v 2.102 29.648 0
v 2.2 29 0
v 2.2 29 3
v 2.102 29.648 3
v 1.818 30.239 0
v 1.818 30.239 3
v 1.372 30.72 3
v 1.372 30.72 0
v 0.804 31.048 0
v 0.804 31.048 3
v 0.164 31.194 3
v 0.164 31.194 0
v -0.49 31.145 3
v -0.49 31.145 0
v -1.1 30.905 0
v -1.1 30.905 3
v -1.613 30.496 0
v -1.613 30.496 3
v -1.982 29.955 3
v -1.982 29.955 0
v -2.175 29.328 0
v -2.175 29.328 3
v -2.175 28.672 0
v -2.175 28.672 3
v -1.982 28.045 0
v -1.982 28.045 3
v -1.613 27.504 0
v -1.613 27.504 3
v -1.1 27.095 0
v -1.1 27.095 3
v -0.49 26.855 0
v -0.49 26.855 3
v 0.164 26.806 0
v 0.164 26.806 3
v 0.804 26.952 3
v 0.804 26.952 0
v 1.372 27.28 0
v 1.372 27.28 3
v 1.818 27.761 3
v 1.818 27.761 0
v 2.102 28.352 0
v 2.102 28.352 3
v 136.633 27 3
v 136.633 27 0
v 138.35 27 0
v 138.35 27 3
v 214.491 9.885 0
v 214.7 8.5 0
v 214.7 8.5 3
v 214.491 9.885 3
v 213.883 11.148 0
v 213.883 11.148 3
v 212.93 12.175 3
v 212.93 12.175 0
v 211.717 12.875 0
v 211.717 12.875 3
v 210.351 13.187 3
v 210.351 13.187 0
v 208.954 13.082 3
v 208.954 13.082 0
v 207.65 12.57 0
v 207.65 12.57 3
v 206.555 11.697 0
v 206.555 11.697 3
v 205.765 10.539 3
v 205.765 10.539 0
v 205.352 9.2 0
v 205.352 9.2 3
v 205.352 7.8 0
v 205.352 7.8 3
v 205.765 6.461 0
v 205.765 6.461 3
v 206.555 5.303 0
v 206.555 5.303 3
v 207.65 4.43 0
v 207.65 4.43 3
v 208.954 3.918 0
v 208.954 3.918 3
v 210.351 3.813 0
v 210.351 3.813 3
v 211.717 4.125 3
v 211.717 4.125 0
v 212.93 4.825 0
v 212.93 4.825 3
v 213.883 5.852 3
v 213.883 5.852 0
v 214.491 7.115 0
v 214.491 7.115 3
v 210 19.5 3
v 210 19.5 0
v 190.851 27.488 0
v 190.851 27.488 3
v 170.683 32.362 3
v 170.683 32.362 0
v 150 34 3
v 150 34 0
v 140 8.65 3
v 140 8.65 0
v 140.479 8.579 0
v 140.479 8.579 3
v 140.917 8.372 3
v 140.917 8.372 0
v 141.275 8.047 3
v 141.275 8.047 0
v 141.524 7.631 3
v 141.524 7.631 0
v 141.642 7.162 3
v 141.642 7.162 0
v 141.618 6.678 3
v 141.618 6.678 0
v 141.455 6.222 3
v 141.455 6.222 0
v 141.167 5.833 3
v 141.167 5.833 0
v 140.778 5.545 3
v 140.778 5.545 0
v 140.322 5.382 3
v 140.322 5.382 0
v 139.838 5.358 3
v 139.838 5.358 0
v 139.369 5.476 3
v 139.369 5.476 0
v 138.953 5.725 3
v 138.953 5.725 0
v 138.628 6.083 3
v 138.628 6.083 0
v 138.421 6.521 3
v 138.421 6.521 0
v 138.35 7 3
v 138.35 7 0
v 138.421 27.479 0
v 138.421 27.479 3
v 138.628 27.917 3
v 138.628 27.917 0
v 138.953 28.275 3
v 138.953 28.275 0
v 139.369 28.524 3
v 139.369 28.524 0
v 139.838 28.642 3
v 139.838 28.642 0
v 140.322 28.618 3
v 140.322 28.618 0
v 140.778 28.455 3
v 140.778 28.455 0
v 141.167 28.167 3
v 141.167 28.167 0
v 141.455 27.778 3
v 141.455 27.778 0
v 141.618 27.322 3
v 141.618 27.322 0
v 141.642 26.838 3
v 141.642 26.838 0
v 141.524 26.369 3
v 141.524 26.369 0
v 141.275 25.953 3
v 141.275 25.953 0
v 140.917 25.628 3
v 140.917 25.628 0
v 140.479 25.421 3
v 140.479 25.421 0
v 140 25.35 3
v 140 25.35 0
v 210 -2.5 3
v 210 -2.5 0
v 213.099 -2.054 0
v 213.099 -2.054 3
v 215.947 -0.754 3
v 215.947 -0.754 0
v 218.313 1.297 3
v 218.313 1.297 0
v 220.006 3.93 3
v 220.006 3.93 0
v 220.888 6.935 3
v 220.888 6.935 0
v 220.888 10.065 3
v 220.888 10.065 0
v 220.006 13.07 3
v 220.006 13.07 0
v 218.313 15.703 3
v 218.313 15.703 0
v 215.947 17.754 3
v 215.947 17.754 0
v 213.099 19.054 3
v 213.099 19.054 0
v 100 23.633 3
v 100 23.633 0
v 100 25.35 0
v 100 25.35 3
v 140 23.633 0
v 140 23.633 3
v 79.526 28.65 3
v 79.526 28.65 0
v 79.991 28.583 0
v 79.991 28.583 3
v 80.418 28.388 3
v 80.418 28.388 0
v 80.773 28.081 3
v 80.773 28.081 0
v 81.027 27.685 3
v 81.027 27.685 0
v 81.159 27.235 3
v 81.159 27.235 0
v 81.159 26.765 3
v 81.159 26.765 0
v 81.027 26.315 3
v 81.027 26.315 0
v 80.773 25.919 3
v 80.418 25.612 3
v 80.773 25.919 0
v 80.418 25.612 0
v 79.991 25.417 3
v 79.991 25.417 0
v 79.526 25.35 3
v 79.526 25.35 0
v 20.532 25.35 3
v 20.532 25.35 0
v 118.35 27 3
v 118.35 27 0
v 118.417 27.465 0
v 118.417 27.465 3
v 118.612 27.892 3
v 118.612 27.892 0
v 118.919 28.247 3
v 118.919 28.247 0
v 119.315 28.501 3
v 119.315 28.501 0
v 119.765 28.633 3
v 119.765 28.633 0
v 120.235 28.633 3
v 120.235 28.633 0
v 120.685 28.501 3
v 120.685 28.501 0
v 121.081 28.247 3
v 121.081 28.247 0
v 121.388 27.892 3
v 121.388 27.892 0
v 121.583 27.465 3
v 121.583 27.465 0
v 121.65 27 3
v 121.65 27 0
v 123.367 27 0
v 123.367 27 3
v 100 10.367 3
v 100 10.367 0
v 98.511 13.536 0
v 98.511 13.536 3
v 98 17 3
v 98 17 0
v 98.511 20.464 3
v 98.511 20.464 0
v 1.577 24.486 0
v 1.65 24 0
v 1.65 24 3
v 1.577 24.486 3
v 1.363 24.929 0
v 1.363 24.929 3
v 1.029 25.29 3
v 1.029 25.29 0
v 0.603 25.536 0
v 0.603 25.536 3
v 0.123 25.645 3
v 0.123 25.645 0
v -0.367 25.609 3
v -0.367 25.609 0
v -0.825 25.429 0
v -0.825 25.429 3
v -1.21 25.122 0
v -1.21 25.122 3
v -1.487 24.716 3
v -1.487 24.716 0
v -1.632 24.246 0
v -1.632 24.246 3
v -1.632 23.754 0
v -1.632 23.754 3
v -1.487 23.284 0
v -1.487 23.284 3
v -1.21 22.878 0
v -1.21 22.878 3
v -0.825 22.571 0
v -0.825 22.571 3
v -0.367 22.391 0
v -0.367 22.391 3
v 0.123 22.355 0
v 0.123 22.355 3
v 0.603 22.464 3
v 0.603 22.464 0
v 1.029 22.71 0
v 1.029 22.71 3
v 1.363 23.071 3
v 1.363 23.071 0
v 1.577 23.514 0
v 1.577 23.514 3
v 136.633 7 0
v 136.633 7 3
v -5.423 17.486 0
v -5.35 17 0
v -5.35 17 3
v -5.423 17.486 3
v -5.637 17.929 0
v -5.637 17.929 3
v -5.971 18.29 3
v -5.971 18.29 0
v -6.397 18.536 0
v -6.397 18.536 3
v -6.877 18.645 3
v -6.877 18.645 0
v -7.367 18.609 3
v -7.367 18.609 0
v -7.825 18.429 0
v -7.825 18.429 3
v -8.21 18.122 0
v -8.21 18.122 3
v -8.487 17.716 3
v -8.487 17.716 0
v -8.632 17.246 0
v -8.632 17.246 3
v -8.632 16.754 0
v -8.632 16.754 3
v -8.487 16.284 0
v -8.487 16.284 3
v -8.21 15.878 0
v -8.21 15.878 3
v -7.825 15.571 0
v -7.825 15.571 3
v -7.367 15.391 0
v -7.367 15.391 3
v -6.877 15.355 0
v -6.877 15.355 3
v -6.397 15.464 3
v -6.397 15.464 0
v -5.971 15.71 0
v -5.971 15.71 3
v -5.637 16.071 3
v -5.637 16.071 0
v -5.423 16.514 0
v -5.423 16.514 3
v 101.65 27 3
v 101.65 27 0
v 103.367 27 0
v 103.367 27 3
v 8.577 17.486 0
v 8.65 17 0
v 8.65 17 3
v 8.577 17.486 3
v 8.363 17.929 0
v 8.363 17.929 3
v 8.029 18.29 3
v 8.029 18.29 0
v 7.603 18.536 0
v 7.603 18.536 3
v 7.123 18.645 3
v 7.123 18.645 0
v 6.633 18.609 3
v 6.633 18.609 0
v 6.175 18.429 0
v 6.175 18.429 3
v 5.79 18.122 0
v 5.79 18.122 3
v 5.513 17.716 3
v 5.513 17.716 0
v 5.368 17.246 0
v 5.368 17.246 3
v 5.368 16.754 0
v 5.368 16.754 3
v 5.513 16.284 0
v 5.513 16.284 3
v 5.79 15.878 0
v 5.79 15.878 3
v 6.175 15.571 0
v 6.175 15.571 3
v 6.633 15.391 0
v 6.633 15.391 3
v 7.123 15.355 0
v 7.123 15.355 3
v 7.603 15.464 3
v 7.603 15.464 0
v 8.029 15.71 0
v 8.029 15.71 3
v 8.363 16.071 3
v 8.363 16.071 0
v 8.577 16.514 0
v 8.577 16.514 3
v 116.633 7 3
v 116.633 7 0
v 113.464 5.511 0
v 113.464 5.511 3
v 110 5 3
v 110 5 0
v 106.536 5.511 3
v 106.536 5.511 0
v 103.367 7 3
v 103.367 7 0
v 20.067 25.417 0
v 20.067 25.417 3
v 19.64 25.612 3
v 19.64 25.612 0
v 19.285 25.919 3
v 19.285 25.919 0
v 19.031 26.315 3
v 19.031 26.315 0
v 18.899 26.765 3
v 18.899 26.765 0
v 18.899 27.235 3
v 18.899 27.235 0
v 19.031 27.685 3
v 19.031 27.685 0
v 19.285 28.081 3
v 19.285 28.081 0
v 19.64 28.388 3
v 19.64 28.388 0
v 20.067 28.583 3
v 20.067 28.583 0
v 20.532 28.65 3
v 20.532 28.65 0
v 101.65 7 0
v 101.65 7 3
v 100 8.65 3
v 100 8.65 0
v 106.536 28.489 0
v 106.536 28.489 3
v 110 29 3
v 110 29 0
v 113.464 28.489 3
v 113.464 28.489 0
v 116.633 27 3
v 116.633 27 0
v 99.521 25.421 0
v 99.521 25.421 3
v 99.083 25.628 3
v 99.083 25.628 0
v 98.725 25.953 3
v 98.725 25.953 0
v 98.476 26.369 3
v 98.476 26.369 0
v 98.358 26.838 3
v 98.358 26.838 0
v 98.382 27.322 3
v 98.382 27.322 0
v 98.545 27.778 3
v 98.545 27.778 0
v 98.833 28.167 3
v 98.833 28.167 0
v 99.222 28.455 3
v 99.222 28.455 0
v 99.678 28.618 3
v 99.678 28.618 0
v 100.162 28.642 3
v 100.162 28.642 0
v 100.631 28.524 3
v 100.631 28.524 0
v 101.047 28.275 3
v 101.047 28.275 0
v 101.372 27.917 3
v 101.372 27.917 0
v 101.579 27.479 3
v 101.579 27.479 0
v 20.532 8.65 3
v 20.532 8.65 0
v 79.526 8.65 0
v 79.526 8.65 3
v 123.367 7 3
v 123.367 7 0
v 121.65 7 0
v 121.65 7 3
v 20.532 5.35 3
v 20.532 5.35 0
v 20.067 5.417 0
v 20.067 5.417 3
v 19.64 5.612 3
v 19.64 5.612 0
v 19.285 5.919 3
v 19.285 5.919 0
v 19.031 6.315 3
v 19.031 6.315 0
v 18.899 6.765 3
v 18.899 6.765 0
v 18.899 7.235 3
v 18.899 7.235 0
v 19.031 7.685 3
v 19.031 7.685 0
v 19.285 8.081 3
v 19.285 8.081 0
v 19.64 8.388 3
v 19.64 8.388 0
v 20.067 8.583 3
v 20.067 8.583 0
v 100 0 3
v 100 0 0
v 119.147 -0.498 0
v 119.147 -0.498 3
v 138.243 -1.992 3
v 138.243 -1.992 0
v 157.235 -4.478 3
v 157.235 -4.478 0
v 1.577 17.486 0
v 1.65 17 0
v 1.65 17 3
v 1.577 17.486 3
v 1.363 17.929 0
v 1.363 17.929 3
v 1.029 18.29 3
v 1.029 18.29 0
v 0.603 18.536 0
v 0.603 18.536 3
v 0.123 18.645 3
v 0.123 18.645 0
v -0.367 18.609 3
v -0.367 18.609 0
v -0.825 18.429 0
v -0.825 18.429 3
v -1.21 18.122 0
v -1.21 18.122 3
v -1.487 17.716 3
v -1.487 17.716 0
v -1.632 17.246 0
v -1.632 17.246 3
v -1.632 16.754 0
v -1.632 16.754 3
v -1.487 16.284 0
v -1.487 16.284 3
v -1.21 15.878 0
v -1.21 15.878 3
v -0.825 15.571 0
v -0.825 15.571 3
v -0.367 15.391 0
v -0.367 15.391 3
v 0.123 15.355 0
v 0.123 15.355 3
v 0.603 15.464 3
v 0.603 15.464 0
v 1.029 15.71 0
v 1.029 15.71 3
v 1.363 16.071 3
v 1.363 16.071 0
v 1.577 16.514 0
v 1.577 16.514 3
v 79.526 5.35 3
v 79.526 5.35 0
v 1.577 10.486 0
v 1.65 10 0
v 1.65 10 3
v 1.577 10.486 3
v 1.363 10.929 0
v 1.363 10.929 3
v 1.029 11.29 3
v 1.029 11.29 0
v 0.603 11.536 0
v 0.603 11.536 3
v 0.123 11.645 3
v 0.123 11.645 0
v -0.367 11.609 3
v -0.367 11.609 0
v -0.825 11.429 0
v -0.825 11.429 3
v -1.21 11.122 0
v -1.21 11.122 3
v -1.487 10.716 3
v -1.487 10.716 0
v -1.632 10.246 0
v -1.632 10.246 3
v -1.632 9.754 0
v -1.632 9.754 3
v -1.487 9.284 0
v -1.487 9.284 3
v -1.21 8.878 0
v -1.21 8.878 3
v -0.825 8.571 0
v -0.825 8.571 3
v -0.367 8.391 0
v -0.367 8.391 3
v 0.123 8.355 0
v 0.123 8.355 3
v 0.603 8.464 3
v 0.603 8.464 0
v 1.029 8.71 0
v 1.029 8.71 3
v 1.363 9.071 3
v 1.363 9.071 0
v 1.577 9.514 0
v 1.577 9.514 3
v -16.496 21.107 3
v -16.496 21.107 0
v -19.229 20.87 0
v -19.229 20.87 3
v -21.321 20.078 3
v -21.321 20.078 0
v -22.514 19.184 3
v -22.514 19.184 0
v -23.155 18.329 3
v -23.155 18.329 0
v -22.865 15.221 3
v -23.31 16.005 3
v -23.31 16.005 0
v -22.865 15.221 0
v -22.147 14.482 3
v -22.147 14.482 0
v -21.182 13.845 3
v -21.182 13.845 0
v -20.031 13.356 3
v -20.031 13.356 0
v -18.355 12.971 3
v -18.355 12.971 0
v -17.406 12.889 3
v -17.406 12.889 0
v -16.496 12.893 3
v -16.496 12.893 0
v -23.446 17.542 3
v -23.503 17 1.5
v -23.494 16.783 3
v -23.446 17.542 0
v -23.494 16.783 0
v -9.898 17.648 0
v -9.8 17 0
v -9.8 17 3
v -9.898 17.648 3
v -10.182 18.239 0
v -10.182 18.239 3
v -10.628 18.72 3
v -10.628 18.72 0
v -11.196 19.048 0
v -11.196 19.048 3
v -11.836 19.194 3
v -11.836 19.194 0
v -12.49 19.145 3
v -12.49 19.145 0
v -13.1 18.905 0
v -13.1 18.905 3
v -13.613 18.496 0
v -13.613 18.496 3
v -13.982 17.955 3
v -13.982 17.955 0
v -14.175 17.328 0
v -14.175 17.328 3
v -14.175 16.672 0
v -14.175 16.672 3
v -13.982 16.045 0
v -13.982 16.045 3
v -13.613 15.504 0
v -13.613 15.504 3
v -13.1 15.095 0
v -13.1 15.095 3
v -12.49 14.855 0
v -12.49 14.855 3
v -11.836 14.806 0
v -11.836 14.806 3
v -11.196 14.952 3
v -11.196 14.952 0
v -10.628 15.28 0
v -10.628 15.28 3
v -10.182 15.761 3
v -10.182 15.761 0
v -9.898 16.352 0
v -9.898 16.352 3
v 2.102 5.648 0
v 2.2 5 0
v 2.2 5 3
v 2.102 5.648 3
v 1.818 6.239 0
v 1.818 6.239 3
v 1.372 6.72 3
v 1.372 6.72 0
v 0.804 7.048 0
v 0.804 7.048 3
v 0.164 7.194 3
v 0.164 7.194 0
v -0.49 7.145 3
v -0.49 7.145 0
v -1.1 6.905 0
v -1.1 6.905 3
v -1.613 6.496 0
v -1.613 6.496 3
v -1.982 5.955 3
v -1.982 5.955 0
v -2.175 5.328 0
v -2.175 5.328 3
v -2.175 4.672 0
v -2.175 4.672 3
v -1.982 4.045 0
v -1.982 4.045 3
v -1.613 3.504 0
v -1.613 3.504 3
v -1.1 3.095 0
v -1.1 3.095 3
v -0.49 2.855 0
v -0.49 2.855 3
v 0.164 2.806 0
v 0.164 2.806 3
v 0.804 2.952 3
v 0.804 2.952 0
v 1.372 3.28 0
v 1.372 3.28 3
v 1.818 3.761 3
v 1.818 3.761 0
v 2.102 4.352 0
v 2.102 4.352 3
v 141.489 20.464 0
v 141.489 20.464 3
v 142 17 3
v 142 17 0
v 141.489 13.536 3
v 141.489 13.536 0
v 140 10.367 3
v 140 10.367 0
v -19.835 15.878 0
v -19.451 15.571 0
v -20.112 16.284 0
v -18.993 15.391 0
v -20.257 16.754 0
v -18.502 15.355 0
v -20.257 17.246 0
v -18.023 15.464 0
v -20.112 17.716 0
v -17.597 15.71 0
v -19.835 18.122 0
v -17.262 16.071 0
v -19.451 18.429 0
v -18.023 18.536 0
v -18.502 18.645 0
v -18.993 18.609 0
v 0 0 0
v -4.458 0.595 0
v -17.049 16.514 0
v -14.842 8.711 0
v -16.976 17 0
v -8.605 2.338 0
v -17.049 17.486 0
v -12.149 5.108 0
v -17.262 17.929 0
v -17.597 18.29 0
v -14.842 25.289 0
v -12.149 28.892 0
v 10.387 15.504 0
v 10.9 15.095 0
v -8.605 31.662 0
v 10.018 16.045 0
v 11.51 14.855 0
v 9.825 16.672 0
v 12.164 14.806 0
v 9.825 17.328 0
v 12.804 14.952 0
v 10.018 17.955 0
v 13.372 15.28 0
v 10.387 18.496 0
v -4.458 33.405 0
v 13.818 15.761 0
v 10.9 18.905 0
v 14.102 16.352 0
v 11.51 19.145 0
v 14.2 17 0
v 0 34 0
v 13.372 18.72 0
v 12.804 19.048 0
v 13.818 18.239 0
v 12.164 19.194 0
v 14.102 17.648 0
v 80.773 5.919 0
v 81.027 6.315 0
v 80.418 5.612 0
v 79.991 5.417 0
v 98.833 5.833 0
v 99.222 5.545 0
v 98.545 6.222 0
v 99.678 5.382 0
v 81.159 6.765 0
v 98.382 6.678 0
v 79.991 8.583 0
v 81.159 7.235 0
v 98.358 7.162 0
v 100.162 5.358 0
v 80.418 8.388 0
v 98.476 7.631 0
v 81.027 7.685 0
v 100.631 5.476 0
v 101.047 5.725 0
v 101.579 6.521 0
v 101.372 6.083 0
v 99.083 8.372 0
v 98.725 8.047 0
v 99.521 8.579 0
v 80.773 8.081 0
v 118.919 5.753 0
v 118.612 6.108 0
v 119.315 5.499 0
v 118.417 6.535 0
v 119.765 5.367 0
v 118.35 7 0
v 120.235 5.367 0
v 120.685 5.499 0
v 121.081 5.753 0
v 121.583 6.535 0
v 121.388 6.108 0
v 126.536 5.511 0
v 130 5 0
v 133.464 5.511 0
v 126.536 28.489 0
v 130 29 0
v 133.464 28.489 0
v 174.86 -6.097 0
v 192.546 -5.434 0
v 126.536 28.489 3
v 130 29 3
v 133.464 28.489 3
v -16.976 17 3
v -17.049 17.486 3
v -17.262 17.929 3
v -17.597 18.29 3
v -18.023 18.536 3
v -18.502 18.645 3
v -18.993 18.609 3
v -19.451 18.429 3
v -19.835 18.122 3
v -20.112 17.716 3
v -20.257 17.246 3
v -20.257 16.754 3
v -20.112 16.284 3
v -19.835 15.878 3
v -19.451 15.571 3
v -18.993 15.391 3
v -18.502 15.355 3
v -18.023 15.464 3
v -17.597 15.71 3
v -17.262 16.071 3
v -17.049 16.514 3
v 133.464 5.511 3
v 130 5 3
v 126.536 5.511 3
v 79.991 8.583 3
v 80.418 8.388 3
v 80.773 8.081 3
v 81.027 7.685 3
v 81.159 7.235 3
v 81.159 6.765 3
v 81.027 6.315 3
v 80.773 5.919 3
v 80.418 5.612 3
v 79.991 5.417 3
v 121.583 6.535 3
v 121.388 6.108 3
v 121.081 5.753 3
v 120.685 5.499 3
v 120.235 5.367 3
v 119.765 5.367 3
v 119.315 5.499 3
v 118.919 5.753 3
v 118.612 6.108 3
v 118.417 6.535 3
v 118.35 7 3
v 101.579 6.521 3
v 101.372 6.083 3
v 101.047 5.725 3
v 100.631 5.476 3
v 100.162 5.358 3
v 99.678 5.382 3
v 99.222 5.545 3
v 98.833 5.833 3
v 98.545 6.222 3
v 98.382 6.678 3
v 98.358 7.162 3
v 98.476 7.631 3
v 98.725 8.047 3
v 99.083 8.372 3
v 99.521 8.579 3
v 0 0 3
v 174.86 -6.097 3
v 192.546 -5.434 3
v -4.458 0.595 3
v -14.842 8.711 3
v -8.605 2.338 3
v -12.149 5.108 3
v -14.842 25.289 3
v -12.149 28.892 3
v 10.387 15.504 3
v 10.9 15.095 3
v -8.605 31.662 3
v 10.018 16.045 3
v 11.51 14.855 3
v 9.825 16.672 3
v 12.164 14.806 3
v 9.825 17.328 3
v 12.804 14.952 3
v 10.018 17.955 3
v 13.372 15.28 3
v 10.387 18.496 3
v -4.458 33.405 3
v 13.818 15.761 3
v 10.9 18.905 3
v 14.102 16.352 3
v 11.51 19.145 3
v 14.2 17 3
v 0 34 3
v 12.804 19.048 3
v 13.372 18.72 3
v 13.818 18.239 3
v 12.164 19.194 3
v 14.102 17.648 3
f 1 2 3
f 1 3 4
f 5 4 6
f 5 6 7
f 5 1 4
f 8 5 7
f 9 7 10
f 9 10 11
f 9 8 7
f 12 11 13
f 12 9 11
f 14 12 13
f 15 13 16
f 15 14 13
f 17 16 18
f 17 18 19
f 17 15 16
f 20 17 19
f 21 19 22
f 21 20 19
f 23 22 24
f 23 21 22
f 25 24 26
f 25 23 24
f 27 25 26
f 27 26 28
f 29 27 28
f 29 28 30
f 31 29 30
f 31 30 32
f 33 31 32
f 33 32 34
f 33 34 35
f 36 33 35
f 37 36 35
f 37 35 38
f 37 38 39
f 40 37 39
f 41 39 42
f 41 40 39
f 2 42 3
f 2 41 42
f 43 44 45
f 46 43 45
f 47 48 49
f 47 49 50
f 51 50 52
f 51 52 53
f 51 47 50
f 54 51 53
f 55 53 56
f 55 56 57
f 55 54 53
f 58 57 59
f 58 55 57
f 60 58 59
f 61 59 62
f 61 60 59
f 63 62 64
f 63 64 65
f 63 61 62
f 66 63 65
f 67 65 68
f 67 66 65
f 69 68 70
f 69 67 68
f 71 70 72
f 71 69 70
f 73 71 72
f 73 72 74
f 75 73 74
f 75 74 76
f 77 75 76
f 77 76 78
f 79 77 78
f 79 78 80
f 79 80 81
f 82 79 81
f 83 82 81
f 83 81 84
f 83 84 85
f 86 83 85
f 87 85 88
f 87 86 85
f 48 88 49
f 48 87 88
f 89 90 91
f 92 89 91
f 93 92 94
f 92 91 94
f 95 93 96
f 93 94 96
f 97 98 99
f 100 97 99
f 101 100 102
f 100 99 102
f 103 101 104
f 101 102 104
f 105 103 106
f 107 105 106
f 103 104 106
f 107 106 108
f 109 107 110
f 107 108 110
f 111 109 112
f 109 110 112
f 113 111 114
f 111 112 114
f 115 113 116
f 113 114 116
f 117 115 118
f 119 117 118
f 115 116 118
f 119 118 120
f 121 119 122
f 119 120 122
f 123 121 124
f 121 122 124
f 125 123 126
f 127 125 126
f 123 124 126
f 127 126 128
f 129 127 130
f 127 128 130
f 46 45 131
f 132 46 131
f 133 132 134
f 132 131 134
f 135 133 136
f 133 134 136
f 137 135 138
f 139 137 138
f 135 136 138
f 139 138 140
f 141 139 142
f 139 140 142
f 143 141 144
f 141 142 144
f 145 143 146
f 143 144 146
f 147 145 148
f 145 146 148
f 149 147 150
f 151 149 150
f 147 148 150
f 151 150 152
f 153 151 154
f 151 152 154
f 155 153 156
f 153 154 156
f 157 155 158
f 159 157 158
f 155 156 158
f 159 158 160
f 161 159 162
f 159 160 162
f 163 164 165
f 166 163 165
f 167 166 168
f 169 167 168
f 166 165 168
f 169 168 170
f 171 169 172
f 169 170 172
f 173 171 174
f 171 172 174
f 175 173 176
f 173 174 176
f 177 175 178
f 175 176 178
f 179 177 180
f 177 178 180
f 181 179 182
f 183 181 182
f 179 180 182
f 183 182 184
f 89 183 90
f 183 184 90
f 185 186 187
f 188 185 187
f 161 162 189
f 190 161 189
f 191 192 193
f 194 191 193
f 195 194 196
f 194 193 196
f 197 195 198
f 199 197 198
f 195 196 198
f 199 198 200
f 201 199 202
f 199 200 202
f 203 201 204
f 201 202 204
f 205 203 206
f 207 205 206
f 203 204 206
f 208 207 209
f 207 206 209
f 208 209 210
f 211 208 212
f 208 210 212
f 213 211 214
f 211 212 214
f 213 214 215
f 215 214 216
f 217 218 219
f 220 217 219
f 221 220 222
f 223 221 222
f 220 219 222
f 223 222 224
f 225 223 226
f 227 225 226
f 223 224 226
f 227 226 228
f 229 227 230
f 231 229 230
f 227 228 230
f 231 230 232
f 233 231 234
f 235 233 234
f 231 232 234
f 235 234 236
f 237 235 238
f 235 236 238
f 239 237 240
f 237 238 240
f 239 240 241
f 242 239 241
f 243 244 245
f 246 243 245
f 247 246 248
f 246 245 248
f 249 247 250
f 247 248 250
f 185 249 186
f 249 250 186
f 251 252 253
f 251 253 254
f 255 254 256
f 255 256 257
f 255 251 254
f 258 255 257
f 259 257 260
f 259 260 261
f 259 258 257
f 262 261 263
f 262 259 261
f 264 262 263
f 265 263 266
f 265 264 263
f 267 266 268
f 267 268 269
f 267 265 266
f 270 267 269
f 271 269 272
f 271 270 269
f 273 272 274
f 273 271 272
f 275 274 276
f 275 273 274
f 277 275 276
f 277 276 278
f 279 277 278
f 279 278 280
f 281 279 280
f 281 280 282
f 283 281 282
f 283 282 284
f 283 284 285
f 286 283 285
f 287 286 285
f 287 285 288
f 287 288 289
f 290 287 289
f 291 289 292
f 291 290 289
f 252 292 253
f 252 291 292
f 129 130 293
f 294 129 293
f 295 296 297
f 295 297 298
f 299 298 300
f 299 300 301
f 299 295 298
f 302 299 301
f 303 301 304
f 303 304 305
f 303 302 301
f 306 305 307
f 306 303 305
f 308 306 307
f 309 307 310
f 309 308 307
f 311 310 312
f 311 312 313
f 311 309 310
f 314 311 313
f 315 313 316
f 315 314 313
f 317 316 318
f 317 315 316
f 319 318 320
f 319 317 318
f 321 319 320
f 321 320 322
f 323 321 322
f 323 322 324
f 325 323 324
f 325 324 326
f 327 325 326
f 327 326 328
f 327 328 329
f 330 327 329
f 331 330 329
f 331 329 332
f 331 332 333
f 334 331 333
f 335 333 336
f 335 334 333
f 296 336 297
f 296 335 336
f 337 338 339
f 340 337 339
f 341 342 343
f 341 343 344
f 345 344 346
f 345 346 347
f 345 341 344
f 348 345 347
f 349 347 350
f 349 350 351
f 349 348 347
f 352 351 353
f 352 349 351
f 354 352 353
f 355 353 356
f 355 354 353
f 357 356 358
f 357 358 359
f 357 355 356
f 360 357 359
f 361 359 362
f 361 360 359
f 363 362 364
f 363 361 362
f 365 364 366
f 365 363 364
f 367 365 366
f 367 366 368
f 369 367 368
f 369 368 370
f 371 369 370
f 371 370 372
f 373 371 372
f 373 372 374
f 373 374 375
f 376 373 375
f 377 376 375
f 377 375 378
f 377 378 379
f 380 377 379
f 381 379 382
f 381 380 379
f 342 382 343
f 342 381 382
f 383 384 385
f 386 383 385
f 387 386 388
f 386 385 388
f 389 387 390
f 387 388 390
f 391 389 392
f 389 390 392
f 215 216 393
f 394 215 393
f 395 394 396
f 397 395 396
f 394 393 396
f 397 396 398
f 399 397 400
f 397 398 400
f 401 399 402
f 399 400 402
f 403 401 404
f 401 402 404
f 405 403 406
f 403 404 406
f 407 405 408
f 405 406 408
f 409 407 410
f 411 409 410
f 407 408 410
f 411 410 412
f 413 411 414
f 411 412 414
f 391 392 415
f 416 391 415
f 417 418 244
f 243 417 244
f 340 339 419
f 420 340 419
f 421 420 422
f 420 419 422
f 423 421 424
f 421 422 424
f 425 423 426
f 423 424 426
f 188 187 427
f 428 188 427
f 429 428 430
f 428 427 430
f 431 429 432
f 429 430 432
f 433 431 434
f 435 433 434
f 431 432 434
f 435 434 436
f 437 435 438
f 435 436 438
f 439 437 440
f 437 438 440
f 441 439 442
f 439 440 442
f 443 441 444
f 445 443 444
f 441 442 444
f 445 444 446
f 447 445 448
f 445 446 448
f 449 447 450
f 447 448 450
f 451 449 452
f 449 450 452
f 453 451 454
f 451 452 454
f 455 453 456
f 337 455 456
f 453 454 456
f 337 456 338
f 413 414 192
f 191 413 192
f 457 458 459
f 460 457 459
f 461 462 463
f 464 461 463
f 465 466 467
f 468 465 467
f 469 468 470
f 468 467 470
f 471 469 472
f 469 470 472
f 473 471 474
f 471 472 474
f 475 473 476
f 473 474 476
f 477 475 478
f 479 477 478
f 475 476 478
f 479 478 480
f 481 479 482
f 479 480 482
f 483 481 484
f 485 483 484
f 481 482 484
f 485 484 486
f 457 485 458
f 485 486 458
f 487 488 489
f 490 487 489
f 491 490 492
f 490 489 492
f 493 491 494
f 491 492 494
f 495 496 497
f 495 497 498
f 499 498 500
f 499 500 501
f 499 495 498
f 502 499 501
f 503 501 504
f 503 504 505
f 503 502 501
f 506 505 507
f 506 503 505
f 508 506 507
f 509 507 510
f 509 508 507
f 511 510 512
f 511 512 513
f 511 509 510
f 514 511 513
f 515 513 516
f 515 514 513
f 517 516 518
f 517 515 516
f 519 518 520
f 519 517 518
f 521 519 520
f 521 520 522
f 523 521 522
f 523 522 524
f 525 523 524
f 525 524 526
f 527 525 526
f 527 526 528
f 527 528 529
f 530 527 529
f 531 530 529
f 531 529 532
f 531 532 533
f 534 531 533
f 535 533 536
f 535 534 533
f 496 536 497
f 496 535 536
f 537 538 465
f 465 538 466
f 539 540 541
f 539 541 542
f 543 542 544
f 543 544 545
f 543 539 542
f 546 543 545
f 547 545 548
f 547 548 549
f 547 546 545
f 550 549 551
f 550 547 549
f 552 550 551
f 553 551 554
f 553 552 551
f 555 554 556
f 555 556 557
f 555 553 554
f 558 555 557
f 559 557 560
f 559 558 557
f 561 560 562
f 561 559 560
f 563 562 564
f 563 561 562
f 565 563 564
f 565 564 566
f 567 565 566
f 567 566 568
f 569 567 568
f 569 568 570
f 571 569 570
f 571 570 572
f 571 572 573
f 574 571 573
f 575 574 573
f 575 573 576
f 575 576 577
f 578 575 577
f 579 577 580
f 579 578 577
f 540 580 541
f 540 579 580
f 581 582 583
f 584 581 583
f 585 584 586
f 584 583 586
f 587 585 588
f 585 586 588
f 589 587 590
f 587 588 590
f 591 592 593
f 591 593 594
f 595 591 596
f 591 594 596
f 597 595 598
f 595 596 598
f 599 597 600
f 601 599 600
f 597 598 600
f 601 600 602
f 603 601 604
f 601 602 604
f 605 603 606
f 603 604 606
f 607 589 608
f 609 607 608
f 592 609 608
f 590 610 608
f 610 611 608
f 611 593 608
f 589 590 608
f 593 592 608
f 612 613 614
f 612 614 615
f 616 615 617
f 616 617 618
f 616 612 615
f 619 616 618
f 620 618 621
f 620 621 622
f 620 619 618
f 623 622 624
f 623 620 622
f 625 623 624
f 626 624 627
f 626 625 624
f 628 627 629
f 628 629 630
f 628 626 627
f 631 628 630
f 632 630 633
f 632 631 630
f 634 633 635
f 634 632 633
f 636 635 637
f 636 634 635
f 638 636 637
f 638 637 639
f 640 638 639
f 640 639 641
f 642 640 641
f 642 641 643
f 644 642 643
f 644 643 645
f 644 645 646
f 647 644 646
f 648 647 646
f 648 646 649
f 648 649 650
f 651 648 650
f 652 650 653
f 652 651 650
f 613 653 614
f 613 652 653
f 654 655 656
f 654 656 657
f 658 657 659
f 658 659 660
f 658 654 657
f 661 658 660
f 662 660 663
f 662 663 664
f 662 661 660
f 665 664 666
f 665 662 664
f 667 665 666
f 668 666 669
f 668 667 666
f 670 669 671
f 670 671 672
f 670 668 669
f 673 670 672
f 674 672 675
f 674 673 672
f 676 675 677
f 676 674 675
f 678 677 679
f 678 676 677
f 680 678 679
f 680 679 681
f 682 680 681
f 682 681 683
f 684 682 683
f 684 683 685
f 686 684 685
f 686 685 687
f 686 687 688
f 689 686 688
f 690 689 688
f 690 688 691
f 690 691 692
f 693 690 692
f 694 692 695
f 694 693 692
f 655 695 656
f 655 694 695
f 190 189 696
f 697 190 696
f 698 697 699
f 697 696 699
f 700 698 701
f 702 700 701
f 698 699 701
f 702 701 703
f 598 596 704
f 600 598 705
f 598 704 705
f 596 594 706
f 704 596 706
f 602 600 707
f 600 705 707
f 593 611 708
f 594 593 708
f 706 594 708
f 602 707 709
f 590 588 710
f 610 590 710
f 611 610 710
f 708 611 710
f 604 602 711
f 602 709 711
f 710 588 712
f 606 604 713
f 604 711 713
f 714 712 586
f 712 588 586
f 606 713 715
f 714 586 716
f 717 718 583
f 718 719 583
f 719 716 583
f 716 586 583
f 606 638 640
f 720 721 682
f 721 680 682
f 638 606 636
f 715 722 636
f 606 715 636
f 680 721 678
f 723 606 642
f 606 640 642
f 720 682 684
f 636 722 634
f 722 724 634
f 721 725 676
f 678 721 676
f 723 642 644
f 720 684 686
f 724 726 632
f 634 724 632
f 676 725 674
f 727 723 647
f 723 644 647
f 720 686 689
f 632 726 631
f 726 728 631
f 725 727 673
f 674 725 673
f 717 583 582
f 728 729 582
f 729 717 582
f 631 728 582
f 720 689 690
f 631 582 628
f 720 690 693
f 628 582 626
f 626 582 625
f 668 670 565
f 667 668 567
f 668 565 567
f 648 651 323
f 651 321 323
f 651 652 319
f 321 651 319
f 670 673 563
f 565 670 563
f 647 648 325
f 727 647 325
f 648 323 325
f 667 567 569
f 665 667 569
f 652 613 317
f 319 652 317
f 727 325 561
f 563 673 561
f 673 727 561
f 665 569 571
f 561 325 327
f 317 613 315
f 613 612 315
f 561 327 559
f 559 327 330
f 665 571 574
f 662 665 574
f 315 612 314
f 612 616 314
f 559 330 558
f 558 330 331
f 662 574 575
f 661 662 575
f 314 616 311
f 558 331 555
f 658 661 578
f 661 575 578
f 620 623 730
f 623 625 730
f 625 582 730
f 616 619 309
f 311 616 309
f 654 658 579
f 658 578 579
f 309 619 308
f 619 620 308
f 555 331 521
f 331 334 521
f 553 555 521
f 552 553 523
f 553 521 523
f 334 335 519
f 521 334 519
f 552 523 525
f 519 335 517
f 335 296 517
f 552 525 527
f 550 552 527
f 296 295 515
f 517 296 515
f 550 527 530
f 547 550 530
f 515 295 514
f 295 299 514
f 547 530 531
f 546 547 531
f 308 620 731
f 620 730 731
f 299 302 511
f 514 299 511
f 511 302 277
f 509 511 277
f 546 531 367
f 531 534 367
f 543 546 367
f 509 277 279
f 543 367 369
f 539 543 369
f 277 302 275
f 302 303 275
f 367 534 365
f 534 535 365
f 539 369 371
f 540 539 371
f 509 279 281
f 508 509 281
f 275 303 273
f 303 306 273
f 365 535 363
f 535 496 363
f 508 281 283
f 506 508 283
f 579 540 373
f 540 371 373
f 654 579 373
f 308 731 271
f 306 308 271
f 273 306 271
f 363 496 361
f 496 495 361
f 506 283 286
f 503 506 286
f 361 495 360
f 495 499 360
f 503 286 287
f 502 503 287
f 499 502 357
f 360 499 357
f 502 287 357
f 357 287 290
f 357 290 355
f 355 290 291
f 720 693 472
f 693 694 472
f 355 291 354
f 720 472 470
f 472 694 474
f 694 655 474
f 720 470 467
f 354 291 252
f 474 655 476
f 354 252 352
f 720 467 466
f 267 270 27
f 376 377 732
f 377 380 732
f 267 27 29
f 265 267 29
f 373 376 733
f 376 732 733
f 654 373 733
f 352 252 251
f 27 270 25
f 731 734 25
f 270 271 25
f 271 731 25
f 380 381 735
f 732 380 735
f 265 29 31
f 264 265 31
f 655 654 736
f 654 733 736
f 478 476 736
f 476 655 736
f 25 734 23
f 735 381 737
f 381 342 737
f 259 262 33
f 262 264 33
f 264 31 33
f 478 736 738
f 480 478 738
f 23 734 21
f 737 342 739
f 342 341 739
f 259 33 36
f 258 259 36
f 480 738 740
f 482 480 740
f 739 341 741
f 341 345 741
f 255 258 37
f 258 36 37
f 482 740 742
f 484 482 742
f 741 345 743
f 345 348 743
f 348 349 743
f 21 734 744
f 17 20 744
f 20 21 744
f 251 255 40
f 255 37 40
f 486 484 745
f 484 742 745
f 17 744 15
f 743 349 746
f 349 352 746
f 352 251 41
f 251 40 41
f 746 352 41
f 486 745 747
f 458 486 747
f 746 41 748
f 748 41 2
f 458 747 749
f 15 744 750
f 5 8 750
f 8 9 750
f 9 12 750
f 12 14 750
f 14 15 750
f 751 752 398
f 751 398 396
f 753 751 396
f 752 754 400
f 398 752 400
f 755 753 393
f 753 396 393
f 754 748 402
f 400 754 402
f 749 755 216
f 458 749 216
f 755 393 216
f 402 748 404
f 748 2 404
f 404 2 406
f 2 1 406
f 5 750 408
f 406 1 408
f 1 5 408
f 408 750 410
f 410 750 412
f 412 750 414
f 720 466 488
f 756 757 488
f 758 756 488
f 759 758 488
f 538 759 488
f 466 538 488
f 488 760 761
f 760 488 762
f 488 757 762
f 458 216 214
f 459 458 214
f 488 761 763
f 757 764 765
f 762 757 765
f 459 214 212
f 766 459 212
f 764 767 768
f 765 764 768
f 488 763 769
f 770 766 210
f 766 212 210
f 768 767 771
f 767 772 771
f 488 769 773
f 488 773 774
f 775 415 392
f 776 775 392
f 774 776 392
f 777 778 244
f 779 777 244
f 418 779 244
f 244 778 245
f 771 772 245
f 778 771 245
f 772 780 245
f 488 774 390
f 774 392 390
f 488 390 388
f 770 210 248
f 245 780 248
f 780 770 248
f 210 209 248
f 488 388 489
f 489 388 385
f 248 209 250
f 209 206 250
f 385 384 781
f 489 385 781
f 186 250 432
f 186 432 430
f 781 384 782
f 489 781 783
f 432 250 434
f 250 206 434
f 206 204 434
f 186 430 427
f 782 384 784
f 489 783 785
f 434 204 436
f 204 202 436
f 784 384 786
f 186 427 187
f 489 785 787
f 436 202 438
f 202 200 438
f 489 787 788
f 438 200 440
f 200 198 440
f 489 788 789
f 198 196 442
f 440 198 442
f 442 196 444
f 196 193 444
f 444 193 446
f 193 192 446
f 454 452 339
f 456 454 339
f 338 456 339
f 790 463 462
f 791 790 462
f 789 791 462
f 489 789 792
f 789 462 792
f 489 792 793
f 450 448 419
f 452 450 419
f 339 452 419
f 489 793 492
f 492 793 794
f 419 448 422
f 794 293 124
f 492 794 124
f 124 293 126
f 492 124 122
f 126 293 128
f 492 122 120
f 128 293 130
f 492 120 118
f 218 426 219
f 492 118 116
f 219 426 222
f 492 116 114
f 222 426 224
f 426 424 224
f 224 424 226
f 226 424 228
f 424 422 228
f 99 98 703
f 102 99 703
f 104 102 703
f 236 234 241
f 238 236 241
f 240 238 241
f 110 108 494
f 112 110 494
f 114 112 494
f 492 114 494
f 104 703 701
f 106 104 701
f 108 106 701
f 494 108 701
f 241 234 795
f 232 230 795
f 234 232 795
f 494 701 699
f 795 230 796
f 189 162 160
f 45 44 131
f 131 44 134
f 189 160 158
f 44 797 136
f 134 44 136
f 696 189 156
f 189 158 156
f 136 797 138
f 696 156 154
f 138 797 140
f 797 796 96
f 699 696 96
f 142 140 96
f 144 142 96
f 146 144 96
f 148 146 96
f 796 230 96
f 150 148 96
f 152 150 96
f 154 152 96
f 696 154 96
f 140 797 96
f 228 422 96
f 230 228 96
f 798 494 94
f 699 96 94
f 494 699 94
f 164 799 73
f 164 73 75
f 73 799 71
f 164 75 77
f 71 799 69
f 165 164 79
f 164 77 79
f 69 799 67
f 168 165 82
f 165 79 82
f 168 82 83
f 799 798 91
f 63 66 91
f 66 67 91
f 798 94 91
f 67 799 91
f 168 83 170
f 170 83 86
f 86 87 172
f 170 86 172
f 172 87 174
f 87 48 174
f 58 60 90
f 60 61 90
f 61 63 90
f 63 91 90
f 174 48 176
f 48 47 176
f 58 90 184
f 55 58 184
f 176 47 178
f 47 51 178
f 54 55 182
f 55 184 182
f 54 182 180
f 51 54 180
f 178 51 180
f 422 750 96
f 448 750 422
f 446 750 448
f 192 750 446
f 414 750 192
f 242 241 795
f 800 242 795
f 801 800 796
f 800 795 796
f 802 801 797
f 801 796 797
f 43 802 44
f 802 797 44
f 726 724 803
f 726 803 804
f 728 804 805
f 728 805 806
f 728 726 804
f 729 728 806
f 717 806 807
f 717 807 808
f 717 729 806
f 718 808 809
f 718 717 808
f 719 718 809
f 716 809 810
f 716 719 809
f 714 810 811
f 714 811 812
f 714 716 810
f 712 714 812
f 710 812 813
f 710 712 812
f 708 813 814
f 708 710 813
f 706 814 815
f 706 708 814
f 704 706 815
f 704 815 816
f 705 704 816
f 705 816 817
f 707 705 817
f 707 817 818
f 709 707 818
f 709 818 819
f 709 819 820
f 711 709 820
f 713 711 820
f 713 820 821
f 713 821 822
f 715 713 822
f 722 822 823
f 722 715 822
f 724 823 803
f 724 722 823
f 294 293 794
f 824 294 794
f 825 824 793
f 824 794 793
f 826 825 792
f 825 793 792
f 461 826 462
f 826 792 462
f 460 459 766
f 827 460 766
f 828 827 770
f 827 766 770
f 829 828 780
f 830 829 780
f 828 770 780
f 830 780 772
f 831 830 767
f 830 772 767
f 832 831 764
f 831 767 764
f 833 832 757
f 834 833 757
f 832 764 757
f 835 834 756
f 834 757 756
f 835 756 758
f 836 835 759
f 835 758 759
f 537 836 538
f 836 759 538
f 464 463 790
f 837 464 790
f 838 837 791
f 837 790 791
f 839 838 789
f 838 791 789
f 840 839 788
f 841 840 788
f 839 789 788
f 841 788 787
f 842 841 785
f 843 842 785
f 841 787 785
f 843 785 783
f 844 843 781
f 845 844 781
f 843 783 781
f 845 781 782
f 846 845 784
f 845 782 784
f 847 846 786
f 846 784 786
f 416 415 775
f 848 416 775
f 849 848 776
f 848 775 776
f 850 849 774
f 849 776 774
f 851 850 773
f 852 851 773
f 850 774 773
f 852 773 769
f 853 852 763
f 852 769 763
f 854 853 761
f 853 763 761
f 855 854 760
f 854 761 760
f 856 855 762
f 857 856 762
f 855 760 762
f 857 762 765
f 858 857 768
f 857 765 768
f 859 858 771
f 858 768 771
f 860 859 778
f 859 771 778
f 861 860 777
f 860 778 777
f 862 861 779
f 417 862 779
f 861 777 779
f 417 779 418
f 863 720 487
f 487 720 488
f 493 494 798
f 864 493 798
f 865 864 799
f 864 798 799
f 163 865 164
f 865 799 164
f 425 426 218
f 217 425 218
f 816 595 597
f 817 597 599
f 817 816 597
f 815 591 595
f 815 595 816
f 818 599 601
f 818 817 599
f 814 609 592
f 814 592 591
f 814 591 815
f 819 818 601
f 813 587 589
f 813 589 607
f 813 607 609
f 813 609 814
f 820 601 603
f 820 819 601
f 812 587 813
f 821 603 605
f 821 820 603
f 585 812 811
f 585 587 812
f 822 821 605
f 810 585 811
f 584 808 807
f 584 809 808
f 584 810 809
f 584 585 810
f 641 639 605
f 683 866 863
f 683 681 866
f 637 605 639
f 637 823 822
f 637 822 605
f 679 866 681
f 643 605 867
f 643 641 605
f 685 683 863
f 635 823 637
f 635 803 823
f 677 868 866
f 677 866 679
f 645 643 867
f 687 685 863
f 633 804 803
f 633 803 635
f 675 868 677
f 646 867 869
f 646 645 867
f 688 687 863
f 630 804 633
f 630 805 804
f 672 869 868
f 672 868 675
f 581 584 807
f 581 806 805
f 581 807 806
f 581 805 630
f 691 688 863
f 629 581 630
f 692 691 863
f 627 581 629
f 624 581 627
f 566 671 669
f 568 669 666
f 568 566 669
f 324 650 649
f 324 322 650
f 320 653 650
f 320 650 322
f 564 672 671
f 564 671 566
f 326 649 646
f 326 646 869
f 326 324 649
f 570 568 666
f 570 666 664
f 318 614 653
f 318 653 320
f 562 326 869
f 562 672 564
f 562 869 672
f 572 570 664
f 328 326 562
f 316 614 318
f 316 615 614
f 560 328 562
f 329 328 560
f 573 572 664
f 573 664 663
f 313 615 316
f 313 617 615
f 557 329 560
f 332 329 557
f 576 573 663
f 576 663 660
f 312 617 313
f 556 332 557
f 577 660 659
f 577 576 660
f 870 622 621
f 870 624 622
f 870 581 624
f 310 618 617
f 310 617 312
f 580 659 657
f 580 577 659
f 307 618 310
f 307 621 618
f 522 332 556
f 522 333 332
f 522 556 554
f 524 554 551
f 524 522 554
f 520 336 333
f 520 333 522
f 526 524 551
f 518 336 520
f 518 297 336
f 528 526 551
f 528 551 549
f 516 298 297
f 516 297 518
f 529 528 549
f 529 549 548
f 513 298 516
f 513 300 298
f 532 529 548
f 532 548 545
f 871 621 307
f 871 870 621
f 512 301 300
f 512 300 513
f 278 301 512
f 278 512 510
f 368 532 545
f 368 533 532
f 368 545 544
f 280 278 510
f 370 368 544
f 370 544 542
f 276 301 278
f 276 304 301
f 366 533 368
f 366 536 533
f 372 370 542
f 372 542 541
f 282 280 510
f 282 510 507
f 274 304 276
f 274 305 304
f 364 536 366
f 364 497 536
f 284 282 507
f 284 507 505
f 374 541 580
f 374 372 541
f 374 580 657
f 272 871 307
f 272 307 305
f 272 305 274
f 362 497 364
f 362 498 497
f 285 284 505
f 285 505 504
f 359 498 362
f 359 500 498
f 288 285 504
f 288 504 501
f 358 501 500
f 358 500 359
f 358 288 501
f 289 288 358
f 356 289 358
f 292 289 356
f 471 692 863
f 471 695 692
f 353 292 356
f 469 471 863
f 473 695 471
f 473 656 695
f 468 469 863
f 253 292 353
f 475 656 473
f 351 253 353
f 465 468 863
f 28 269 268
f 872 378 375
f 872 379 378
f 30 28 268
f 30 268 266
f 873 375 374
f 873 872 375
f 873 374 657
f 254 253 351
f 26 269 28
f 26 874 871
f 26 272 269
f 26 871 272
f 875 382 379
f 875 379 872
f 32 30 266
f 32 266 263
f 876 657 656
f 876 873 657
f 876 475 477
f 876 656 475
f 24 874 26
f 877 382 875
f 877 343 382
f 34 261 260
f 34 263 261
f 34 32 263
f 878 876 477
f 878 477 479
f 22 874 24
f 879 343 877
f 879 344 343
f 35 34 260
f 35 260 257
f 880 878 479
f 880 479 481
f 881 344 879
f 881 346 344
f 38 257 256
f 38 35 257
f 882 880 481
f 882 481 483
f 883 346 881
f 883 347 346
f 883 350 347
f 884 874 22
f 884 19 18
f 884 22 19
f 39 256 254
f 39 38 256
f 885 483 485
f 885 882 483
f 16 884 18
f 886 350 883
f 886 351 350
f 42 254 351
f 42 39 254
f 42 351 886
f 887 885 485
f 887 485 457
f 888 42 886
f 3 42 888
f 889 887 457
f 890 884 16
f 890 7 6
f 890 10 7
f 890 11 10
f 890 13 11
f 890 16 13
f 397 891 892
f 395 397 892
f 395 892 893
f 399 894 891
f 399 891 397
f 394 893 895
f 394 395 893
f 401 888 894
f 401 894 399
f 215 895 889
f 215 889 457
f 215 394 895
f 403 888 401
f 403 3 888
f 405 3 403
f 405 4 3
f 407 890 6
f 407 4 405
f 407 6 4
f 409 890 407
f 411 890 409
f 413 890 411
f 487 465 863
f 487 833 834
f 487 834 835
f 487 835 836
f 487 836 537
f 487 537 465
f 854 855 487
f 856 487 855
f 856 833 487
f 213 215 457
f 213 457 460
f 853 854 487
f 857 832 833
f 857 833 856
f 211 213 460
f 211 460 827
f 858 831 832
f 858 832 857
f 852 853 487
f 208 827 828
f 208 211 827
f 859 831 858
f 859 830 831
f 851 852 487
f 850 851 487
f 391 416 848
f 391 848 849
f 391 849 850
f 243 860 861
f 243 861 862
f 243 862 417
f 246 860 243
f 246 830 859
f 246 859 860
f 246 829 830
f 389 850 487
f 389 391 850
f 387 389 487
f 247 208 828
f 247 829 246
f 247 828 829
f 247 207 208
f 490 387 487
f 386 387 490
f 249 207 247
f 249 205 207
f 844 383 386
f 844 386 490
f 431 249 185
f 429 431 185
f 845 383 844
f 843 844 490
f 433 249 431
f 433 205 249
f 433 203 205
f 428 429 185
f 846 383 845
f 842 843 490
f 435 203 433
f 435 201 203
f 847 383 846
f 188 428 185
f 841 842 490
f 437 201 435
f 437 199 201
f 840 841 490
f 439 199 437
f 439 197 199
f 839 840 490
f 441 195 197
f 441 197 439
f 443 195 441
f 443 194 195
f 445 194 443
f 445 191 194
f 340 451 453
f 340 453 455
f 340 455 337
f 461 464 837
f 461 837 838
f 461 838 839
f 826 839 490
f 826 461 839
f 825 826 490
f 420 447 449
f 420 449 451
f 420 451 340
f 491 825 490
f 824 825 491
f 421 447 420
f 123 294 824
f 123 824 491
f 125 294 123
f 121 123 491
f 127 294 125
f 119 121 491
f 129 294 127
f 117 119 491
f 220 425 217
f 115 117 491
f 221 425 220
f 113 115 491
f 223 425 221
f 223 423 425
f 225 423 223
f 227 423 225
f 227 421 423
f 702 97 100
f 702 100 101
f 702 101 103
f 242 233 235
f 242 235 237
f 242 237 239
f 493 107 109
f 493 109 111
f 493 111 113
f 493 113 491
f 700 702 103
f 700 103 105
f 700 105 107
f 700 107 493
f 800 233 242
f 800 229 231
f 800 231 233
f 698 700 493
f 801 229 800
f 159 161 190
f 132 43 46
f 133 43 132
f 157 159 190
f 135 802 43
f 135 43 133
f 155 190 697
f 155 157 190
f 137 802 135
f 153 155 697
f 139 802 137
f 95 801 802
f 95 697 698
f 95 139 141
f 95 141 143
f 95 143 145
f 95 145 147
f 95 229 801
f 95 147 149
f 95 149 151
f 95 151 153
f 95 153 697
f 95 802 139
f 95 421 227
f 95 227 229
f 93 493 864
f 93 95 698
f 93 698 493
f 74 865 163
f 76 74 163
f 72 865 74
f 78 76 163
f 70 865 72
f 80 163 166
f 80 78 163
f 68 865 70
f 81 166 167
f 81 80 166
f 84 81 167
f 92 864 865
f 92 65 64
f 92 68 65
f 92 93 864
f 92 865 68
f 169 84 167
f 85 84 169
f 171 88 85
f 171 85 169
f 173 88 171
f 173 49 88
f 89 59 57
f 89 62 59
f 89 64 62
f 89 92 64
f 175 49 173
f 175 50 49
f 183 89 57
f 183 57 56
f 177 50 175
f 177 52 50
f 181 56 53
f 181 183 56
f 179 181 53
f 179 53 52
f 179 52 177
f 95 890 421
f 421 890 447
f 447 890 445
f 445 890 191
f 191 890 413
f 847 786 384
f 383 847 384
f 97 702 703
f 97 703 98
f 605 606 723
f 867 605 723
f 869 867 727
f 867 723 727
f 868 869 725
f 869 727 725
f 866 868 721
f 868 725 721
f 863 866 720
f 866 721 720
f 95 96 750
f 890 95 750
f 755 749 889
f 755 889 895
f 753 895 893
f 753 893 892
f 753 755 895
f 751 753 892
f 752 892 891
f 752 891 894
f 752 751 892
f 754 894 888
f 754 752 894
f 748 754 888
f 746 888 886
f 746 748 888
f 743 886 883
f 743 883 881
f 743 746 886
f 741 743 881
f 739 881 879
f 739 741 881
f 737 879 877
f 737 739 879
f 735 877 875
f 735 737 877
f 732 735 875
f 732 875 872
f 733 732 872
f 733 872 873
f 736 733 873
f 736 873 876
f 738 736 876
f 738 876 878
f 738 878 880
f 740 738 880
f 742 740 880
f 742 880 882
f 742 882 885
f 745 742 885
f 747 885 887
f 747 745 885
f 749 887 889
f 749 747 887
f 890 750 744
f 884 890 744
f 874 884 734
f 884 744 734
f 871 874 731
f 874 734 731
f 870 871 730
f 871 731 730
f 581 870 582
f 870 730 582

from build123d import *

# Parameters (mm, degrees)
SKETCH_1_R      = 1.65
SKETCH_1_R_2    = 2.2
SKETCH_1_R_3    = 4.7
EXTRUDE_2_DEPTH = 3
SKETCH_2_R      = 5.981334021
SKETCH_2_R_2    = 5
EXTRUDE_3_DEPTH = 3


with BuildPart() as part:
    # 草图1 → 凸台-拉伸2 (new body)
    with BuildSketch(Plane.XY):
        with BuildLine():
            ThreePointArc((-16.496458662, 12.893072729), (-10.468577659, 3.605639926), (0, 0))
            Line((0, 0), (100, 0))
            ThreePointArc((100, 0), (128.704894857, -1.12114561), (157.234899277, -4.47775163))
            ThreePointArc((157.234899277, -4.47775163), (183.713480844, -6.050924628), (210, -2.5))
            ThreePointArc((210, -2.5), (221, 8.5), (210, 19.5))
            ThreePointArc((210, 19.5), (180.86361126, 30.323563834), (150, 34))
            Line((150, 34), (0, 34))
            ThreePointArc((0, 34), (-10.468577659, 30.394360075), (-16.496458662, 21.106927271))
            add(Edge.make_bspline(
                [(-16.496458662, 21.106927271), (-23.502676935, 21.451644876), (-23.502676935, 17)],
                knots=[4.634875375, 4.634875375, 4.634875375, 6.283185307, 6.283185307, 6.283185307], degree=2, weights=[1, 0.679177441, 1]))
            add(Edge.make_bspline(
                [(-23.502676935, 17), (-23.502676935, 12.548355124), (-16.496458662, 12.893072729)],
                knots=[0, 0, 0, 1.648309932, 1.648309932, 1.648309932], degree=2, weights=[1, 0.679177441, 1]))
        make_face()
        with Locations((0, 17)):
            Circle(SKETCH_1_R, mode=Mode.SUBTRACT)
        with Locations((0, 10)):
            Circle(SKETCH_1_R, mode=Mode.SUBTRACT)
        with Locations((0, 5)):
            Circle(SKETCH_1_R_2, mode=Mode.SUBTRACT)
        with Locations((0, 29)):
            Circle(SKETCH_1_R_2, mode=Mode.SUBTRACT)
        with Locations((0, 24)):
            Circle(SKETCH_1_R, mode=Mode.SUBTRACT)
        with Locations((-7, 17)):
            Circle(SKETCH_1_R, mode=Mode.SUBTRACT)
        with Locations((-18.625669234, 17)):
            Circle(SKETCH_1_R, mode=Mode.SUBTRACT)
        with Locations((210, 8.5)):
            Circle(SKETCH_1_R_3, mode=Mode.SUBTRACT)
        with BuildLine():
            Line((140, 10.366750419), (140, 8.65))
            ThreePointArc((140, 8.65), (141.166726189, 5.833273811), (138.35, 7))
            Line((138.35, 7), (136.633249581, 7))
            ThreePointArc((136.633249581, 7), (130, 5), (123.366750419, 7))
            Line((123.366750419, 7), (121.65, 7))
            ThreePointArc((121.65, 7), (120, 5.35), (118.35, 7))
            Line((118.35, 7), (116.633249581, 7))
            ThreePointArc((116.633249581, 7), (110, 5), (103.366750419, 7))
            Line((103.366750419, 7), (101.65, 7))
            ThreePointArc((101.65, 7), (98.833273811, 5.833273811), (100, 8.65))
            Line((100, 8.65), (100, 10.366750419))
            ThreePointArc((100, 10.366750419), (98, 17), (100, 23.633249581))
            Line((100, 23.633249581), (100, 25.35))
            ThreePointArc((100, 25.35), (98.833273811, 28.166726189), (101.65, 27))
            Line((101.65, 27), (103.366750419, 27))
            ThreePointArc((103.366750419, 27), (110, 29), (116.633249581, 27))
            Line((116.633249581, 27), (118.35, 27))
            ThreePointArc((118.35, 27), (120, 28.65), (121.65, 27))
            Line((121.65, 27), (123.366750419, 27))
            ThreePointArc((123.366750419, 27), (130, 29), (136.633249581, 27))
            Line((136.633249581, 27), (138.35, 27))
            ThreePointArc((138.35, 27), (141.166726189, 28.166726189), (140, 25.35))
            Line((140, 25.35), (140, 23.633249581))
            ThreePointArc((140, 23.633249581), (142, 17), (140, 10.366750419))
        make_face(mode=Mode.SUBTRACT)
        with Locations((-12, 17)):
            Circle(SKETCH_1_R_2, mode=Mode.SUBTRACT)
        with Locations((7, 17)):
            Circle(SKETCH_1_R, mode=Mode.SUBTRACT)
        with Locations((12, 17)):
            Circle(SKETCH_1_R_2, mode=Mode.SUBTRACT)
        with BuildLine():
            Line((20.531708218, 28.65), (79.525747225, 28.65))
            ThreePointArc((79.525747225, 28.65), (81.175747225, 27), (79.525747225, 25.35))
            Line((79.525747225, 25.35), (20.531708218, 25.35))
            ThreePointArc((20.531708218, 25.35), (18.881708218, 27), (20.531708218, 28.65))
        make_face(mode=Mode.SUBTRACT)
        with BuildLine():
            Line((79.525747225, 5.35), (20.531708218, 5.35))
            ThreePointArc((20.531708218, 5.35), (18.881708218, 7), (20.531708218, 8.65))
            Line((20.531708218, 8.65), (79.525747225, 8.65))
            ThreePointArc((79.525747225, 8.65), (81.175747225, 7), (79.525747225, 5.35))
        make_face(mode=Mode.SUBTRACT)
    extrude(amount=EXTRUDE_2_DEPTH)

    # 草图2 → 凸台-拉伸3 (add)
    with BuildSketch(Plane.XY.offset(3)):
        with Locations((210, 8.5)):
            Circle(SKETCH_2_R)
        with Locations((210, 8.5)):
            Circle(SKETCH_2_R_2, mode=Mode.SUBTRACT)
    extrude(amount=-EXTRUDE_3_DEPTH)


solid = part.part
